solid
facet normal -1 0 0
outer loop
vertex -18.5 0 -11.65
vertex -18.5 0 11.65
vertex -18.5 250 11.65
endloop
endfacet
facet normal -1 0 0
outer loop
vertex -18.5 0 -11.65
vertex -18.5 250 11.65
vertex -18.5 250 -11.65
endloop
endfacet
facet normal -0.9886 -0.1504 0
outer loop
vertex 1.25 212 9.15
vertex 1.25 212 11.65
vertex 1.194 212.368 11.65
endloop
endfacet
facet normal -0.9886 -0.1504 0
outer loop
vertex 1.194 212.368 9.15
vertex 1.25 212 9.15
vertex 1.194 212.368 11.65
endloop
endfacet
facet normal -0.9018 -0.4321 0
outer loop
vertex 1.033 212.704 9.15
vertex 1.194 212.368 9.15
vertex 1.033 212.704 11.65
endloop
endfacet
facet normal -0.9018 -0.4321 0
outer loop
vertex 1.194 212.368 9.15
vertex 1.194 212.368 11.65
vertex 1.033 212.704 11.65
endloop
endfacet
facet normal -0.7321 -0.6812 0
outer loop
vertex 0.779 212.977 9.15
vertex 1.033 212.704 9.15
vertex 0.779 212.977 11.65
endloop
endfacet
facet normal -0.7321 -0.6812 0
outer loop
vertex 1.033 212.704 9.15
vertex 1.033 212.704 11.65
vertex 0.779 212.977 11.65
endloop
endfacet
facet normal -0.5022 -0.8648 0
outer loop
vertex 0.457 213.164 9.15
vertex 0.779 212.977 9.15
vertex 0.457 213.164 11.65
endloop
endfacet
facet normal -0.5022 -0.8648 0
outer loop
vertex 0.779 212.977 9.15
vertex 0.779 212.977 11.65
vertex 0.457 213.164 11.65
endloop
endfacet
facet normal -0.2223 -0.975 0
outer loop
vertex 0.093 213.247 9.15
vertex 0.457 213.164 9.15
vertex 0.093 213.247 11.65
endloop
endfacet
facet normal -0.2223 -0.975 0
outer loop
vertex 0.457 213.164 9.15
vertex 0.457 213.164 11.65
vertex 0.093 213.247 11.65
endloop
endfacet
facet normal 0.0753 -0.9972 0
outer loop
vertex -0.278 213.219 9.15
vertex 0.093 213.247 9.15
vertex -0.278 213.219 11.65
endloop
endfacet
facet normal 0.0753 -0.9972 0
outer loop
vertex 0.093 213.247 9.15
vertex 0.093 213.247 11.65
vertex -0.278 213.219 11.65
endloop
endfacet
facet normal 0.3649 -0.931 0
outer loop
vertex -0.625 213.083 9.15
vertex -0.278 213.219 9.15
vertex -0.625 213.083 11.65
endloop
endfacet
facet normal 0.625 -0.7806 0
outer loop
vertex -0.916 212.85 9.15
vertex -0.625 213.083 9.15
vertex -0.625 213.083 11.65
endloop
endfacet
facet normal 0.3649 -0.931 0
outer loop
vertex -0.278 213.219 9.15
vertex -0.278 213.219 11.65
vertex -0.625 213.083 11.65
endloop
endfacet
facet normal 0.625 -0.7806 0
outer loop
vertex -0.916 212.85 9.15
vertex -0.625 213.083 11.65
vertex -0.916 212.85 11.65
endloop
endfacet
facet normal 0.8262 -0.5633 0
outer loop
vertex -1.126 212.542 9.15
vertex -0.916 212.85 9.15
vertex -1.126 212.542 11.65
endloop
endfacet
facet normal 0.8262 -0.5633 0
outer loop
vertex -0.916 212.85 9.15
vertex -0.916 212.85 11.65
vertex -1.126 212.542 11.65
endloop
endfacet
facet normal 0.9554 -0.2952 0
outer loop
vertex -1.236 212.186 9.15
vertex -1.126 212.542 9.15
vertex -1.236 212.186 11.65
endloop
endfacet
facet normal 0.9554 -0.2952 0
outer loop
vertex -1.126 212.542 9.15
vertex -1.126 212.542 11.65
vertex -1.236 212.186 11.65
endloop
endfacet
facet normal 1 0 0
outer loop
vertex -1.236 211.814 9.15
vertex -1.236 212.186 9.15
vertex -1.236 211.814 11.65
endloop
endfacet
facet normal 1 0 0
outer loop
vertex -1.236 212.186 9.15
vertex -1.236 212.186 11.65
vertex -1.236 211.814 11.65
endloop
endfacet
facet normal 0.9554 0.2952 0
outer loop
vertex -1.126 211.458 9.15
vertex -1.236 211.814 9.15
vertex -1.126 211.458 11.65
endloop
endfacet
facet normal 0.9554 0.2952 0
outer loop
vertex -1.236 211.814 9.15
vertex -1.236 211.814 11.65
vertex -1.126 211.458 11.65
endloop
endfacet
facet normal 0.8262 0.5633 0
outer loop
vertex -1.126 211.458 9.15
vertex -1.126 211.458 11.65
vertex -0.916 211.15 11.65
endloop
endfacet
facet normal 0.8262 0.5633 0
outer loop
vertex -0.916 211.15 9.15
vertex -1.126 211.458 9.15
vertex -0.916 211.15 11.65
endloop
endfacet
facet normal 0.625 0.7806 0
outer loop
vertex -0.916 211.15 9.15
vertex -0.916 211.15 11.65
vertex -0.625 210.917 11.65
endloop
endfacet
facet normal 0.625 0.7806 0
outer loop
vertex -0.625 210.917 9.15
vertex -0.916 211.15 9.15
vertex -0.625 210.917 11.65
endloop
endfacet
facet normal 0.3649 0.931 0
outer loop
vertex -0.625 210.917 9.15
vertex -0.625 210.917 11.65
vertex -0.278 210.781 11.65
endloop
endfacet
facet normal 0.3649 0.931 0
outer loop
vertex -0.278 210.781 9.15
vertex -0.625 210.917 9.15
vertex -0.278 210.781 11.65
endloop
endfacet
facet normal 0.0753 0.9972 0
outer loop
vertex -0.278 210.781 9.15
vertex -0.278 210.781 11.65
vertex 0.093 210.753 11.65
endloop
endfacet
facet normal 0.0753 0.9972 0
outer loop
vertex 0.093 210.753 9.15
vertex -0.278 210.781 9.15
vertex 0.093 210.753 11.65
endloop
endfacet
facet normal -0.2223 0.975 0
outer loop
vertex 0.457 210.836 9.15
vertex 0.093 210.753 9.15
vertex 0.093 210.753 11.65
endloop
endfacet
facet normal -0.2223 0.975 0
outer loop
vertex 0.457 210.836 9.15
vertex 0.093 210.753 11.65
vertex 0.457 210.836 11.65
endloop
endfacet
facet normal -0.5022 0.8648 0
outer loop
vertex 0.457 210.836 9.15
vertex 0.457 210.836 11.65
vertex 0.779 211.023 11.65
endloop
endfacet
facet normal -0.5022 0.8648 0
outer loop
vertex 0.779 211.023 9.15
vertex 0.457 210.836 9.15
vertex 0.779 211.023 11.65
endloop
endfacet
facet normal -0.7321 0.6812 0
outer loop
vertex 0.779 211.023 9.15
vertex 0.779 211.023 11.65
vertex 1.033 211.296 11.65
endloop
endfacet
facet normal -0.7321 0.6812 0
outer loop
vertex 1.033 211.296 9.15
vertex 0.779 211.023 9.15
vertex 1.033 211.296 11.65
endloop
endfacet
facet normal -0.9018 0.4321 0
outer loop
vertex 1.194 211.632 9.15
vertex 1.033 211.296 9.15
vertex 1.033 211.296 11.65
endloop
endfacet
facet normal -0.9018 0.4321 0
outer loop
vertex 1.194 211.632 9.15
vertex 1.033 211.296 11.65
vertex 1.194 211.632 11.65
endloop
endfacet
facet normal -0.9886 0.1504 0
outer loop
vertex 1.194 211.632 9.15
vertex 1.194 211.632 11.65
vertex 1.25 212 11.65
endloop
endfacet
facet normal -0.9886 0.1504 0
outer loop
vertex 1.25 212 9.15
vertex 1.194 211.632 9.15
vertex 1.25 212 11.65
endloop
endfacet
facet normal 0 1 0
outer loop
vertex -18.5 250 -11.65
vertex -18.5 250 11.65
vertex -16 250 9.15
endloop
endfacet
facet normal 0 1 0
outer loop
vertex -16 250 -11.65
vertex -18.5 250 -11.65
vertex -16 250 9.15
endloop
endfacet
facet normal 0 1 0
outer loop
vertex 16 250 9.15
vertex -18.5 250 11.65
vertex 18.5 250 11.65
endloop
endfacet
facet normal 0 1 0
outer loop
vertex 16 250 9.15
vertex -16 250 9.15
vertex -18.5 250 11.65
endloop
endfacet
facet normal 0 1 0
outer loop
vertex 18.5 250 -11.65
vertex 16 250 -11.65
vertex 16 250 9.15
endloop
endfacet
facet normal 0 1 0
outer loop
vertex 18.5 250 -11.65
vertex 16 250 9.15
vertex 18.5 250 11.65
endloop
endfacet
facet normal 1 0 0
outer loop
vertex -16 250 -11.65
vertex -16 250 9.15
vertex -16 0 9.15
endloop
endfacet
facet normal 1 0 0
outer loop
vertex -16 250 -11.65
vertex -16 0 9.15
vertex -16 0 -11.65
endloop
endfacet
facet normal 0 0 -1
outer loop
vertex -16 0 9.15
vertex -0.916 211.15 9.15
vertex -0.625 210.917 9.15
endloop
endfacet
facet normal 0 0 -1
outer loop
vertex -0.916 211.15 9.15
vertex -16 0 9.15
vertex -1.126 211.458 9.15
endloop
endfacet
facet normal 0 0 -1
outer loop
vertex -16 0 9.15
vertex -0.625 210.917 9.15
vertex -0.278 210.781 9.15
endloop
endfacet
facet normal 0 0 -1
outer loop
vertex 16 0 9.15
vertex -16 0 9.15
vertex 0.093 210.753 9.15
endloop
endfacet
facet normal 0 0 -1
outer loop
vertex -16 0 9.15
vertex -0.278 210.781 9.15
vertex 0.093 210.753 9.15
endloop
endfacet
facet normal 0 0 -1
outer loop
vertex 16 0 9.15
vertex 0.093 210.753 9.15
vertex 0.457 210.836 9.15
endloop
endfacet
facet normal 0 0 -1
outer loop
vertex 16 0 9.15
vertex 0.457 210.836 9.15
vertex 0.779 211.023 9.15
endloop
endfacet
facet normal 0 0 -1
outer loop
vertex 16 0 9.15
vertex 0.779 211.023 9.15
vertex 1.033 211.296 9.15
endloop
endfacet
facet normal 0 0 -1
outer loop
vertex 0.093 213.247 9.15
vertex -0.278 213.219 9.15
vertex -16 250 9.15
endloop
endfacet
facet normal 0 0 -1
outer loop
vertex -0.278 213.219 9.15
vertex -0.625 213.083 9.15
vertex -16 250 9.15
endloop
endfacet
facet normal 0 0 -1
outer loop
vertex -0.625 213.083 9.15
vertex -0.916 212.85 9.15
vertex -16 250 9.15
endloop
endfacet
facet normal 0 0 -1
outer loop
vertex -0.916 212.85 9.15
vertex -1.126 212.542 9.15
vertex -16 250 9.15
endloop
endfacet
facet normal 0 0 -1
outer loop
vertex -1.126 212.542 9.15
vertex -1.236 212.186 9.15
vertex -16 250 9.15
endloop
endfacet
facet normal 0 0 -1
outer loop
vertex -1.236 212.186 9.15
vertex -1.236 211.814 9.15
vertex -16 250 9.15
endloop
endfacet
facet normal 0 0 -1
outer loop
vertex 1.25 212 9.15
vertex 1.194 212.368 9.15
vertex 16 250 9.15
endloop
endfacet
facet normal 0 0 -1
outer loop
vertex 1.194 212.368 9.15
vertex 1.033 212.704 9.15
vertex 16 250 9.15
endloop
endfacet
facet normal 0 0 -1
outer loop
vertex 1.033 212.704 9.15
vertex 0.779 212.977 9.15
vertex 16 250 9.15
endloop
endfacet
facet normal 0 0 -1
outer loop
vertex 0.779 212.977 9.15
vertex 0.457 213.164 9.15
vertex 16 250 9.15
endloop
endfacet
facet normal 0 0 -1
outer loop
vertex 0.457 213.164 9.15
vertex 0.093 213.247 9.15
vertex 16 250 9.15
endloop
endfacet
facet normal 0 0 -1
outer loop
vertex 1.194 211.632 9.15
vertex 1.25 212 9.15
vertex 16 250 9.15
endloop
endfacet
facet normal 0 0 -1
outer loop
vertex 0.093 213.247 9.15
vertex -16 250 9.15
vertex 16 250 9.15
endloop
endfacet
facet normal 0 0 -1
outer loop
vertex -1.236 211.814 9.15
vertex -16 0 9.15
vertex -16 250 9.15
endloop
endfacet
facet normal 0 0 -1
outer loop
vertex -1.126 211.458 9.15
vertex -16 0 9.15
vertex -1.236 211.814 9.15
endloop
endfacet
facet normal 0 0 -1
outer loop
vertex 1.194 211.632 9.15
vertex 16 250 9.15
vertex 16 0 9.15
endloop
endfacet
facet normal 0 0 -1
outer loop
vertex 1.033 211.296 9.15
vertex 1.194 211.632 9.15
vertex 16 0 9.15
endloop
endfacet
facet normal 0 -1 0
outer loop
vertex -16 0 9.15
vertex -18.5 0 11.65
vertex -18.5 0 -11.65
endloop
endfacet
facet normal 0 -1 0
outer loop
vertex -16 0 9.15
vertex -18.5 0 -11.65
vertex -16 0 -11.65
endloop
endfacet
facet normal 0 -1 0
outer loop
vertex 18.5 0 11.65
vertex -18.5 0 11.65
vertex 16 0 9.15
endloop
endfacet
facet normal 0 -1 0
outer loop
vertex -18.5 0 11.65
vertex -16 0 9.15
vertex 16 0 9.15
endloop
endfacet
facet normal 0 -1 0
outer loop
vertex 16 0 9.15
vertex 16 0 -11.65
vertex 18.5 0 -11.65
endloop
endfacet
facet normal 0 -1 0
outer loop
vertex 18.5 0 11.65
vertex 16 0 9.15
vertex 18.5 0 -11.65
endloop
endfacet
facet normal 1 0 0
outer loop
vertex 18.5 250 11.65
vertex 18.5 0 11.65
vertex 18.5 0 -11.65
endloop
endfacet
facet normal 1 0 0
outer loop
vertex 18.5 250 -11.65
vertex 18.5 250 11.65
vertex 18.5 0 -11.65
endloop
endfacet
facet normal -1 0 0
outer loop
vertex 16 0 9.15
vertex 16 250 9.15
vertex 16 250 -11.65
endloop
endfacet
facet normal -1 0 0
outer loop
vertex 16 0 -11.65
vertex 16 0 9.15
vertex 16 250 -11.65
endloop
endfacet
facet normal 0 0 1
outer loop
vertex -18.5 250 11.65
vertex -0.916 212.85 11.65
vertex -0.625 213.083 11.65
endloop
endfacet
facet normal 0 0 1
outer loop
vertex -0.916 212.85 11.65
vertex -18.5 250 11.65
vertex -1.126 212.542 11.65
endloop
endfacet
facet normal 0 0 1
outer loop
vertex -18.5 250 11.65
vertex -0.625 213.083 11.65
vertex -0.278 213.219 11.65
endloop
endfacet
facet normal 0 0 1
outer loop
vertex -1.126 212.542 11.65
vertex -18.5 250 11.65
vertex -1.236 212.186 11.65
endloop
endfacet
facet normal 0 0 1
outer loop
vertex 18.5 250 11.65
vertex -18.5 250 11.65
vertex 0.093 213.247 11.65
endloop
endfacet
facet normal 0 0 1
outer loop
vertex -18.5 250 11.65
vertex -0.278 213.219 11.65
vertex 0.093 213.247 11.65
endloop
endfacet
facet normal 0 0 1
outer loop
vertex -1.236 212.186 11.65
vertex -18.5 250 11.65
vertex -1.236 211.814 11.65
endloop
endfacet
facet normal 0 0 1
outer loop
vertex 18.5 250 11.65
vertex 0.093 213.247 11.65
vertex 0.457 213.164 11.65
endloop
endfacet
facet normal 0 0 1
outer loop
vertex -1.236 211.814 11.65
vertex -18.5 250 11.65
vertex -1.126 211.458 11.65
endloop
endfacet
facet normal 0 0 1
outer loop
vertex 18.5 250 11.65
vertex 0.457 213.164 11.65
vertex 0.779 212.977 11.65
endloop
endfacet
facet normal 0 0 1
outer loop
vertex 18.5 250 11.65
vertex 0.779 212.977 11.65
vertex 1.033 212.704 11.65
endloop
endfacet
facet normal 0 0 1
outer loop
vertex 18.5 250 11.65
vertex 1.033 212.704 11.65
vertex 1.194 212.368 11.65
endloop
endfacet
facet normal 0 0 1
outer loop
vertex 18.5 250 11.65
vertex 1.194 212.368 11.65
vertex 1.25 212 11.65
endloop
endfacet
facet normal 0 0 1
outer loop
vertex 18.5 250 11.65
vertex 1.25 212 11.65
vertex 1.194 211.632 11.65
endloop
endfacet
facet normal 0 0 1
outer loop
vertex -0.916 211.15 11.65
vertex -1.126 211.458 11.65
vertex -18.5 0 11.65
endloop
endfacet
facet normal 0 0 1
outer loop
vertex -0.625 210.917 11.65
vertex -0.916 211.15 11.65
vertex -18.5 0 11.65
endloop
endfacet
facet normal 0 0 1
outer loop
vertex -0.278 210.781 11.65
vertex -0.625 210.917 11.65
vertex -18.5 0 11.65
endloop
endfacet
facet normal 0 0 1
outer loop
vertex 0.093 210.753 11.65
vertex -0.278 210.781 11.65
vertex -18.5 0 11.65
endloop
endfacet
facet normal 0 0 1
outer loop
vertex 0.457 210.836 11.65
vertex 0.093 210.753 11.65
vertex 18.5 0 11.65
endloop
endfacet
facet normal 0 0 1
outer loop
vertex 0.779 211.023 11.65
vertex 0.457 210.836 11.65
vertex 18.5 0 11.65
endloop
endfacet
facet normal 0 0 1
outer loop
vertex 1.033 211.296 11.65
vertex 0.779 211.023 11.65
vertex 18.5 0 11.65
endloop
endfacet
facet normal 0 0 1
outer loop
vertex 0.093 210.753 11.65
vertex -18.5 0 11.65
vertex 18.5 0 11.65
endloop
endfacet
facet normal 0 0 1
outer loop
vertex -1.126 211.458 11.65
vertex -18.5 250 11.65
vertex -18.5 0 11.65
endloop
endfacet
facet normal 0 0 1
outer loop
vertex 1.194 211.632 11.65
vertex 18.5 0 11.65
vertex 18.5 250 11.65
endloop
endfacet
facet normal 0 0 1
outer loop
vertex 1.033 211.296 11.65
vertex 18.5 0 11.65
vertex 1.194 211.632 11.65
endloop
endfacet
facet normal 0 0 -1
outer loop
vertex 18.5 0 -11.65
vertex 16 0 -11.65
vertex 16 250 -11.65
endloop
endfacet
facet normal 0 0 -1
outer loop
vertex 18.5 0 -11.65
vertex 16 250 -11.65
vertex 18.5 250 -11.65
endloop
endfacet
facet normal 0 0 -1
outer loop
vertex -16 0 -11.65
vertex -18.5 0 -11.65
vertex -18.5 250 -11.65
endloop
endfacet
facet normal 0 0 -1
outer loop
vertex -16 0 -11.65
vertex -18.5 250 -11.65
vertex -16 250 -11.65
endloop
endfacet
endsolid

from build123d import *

# Parameters (mm, degrees)
CROQUIS1_W              = 37
CROQUIS1_H              = 23.3
SALIENTE_EXTRUIR1_DEPTH = 250
CROQUIS2_W              = 32
CROQUIS2_H              = 20.8
CORTAR_EXTRUIR1_DEPTH   = 250
CROQUIS3_R              = 1.25
CORTAR_EXTRUIR2_DEPTH   = 250


with BuildPart() as part:
    # Croquis1 → Saliente-Extruir1 (new body)
    with BuildSketch(Plane(origin=(0, 0, 0), x_dir=(1, 0, 0), z_dir=(0, 1, 0))):
        Rectangle(CROQUIS1_W, CROQUIS1_H)
    extrude(amount=SALIENTE_EXTRUIR1_DEPTH)

    # Croquis2 → Cortar-Extruir1 (cut)
    with BuildSketch(Plane(origin=(0, 250, 0), x_dir=(1, 0, 0), z_dir=(0, 1, 0))):
        with Locations((0, 1.25)):
            Rectangle(CROQUIS2_W, CROQUIS2_H)
    extrude(amount=-CORTAR_EXTRUIR1_DEPTH, mode=Mode.SUBTRACT)

    # Croquis3 → Cortar-Extruir2 (cut)
    with BuildSketch(Plane.XY.offset(11.65)):
        with Locations((0, 212)):
            Circle(CROQUIS3_R)
    extrude(amount=-CORTAR_EXTRUIR2_DEPTH, mode=Mode.SUBTRACT)


solid = part.part
